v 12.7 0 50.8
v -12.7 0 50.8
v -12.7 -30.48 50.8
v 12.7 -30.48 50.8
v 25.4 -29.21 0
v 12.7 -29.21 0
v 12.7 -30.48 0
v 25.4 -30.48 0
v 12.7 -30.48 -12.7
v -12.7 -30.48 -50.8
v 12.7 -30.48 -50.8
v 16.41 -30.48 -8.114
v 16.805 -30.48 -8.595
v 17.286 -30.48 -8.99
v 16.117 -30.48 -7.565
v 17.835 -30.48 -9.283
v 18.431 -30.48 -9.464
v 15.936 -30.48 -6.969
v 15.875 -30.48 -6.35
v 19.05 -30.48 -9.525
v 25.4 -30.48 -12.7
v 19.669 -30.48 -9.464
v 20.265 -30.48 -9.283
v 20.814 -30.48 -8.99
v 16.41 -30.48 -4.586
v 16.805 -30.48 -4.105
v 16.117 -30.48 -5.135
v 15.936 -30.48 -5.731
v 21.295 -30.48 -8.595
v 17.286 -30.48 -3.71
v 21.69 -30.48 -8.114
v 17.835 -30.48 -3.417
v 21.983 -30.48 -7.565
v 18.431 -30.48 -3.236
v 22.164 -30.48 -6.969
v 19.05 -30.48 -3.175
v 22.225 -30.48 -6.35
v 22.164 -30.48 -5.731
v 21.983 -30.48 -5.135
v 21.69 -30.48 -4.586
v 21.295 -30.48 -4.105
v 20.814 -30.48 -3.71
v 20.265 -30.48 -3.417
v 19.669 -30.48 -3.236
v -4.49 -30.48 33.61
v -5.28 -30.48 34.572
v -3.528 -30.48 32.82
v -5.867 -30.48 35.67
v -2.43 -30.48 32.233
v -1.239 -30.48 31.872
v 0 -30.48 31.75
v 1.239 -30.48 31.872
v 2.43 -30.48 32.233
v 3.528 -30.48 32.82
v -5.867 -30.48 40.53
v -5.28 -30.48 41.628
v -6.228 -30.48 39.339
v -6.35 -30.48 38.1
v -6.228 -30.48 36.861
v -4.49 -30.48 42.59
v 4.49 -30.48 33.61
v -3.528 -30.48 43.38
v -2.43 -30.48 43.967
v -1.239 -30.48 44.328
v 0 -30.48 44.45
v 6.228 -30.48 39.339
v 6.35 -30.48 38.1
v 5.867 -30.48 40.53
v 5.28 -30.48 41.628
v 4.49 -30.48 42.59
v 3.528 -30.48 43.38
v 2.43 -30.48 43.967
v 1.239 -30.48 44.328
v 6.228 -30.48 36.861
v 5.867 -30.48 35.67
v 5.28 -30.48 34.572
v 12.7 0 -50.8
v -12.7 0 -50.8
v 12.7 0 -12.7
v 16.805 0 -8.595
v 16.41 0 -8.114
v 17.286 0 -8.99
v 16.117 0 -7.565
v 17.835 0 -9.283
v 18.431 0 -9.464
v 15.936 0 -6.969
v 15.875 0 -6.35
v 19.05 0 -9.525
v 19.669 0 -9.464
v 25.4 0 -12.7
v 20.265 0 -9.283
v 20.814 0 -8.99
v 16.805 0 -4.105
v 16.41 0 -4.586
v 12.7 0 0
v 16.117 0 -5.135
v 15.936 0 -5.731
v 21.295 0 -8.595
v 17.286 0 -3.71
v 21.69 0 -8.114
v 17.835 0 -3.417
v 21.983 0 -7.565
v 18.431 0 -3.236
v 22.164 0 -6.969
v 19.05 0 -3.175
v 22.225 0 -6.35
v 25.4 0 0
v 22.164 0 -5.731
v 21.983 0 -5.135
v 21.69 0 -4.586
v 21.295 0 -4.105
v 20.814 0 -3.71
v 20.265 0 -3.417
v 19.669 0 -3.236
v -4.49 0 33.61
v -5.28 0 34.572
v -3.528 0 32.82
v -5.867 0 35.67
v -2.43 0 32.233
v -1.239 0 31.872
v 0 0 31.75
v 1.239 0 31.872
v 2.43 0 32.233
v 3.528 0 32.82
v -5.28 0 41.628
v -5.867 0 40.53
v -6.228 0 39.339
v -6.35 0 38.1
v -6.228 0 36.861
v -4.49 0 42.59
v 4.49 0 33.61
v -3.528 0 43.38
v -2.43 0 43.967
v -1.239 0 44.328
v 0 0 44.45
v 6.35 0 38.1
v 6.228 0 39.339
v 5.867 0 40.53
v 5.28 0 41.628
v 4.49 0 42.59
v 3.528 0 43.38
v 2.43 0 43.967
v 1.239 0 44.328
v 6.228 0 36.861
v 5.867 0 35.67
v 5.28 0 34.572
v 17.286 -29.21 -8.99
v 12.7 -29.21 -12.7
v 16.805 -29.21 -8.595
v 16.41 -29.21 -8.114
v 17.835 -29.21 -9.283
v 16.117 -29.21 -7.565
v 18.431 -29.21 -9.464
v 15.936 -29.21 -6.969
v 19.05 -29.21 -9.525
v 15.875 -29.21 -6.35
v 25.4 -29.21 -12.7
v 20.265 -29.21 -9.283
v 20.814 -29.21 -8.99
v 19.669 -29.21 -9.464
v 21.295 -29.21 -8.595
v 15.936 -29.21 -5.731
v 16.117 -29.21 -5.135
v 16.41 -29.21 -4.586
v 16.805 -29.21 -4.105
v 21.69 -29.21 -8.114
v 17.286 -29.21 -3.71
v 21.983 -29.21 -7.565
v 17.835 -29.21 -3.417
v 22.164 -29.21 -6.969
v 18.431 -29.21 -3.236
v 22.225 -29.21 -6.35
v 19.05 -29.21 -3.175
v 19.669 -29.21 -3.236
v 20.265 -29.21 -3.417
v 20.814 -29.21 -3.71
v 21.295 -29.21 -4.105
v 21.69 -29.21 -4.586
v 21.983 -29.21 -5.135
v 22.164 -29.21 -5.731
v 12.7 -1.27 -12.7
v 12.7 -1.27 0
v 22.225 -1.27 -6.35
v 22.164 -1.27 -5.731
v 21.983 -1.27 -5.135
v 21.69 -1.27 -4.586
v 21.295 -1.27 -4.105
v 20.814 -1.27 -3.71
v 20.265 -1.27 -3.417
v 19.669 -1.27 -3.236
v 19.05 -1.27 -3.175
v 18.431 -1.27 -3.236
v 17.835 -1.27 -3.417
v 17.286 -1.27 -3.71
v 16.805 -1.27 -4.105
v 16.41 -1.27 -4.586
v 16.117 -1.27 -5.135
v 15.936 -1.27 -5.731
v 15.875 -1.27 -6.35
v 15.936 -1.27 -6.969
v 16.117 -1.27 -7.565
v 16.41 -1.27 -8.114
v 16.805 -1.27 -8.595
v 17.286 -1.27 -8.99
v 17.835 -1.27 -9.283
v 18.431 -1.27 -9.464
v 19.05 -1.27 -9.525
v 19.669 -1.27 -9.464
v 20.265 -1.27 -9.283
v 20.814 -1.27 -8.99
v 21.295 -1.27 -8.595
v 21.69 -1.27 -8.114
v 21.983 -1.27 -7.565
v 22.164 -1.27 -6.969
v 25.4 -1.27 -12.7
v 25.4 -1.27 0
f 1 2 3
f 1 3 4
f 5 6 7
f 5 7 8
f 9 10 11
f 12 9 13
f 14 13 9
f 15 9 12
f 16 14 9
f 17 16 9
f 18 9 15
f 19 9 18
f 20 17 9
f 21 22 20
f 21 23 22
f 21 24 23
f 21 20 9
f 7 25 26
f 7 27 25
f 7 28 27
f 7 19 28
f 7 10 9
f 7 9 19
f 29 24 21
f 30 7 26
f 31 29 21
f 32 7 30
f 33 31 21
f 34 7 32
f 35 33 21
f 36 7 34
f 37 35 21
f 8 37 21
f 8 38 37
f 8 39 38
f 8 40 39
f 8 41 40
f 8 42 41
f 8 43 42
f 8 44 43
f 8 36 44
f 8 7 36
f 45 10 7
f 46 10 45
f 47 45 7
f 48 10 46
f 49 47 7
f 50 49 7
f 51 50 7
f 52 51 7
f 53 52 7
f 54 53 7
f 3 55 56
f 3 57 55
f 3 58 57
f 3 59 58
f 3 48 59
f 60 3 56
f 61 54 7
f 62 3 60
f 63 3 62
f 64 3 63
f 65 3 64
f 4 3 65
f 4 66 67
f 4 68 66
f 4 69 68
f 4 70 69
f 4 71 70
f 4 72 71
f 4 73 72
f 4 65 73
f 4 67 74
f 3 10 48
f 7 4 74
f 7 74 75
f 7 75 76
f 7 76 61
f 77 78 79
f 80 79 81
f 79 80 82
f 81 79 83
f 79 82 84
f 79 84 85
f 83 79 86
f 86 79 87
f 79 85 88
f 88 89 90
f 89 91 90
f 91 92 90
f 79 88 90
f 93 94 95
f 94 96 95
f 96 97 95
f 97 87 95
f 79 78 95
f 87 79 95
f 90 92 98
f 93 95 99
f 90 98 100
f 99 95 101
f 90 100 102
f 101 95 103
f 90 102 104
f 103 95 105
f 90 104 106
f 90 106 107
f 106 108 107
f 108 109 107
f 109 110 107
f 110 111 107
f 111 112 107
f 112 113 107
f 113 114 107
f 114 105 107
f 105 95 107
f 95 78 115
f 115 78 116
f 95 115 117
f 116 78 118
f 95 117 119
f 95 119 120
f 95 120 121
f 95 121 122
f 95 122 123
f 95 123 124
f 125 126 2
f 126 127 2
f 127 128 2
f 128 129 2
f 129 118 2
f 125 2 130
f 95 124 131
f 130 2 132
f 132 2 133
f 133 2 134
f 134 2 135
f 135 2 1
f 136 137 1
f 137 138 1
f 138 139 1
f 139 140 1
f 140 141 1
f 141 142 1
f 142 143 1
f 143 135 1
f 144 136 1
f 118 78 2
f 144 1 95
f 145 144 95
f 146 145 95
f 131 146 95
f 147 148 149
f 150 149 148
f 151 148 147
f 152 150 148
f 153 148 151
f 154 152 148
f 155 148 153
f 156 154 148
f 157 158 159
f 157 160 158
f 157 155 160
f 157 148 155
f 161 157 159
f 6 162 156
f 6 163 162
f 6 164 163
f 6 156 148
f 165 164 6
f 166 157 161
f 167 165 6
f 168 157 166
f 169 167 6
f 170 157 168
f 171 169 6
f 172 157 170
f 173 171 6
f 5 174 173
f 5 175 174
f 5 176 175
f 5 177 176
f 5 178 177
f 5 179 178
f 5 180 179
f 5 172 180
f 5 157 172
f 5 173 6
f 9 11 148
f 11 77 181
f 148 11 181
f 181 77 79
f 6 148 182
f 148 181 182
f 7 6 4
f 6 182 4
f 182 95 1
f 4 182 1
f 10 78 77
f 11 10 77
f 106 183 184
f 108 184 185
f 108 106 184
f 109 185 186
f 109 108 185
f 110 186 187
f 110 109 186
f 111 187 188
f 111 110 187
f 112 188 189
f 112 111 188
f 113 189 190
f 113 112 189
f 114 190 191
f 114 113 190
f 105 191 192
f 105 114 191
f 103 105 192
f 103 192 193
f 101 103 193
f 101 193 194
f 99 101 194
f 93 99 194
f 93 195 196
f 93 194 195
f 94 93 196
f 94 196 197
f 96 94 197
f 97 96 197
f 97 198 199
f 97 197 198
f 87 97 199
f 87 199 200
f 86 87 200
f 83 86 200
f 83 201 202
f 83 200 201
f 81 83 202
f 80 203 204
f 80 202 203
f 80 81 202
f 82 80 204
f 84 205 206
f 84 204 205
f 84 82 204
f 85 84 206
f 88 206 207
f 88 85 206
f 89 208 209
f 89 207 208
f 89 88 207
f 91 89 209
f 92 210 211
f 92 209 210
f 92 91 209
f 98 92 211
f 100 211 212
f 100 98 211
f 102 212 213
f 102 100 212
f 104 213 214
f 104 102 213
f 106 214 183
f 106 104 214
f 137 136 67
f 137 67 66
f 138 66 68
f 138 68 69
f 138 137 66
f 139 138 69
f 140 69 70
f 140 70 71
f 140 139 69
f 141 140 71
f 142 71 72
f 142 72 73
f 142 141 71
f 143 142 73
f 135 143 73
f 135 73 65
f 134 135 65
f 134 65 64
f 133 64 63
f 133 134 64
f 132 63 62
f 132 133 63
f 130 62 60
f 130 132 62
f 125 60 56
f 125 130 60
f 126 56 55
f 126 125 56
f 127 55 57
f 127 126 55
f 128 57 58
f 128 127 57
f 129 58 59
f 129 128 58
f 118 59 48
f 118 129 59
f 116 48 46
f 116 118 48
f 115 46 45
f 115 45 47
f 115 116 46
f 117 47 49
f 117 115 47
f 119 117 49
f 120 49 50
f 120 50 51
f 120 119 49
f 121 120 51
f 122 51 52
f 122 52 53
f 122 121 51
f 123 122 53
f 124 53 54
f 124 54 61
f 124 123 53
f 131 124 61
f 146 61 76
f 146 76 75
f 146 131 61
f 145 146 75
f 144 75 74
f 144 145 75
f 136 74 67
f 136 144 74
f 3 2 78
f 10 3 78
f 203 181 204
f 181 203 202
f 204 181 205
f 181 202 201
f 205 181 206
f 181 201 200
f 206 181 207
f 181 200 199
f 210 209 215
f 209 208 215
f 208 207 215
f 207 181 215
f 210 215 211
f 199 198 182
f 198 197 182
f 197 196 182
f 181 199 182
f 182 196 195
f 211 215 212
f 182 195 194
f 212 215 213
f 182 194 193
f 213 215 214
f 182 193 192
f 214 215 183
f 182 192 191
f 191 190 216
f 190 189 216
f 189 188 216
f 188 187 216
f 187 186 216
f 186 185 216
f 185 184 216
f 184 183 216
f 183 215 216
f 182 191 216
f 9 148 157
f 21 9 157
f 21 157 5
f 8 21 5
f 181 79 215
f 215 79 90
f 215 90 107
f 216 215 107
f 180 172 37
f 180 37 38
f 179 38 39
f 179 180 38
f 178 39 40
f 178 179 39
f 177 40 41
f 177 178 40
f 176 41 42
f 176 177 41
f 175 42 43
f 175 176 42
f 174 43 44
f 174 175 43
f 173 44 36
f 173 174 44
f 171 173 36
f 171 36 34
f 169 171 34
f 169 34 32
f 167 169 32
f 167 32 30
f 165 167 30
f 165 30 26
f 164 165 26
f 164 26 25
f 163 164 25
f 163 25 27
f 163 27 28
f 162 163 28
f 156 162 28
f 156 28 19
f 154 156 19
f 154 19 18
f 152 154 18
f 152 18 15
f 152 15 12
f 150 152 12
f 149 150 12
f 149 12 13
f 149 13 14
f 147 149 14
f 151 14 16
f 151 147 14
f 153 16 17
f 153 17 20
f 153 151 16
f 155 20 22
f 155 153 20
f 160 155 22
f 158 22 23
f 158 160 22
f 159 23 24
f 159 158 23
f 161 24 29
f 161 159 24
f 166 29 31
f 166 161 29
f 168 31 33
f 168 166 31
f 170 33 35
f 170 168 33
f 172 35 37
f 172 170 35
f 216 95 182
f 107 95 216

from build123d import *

# Parameters (mm, degrees)
F0_W     = 25.4
F0_H     = 25.4
F0_R     = 6.35
F0_W_2   = 12.7
F0_H_2   = 12.7
F0_R_2   = 3.175
F1_DEPTH = 30.48
F2_W     = 27.94
F2_H     = 12.7
F3_DEPTH = 12.7


with BuildPart() as f1:
    # F0 (on Front) → F1 (new body)
    with BuildSketch(Plane.XZ):
        with Locations((0, 38.1)):
            Rectangle(F0_W, F0_H)
        with Locations((0, 38.1)):
            Circle(F0_R, mode=Mode.SUBTRACT)
        Polygon((12.7, 25.4), (-12.7, 25.4), (-12.7, -50.8), (12.7, -50.8), (12.7, -12.7), (12.7, 0), align=None)
        with Locations((19.05, -6.35)):
            Rectangle(F0_W_2, F0_H_2)
        with Locations((19.05, -6.35)):
            Circle(F0_R_2, mode=Mode.SUBTRACT)
    extrude(amount=F1_DEPTH)

    # F2 (on face) → F3 (cut)
    with BuildSketch(Plane.YZ.offset(25.4)):
        with Locations((-15.24, -6.35)):
            Rectangle(F2_W, F2_H)
    extrude(amount=-F3_DEPTH, mode=Mode.SUBTRACT)


solid = f1.part
